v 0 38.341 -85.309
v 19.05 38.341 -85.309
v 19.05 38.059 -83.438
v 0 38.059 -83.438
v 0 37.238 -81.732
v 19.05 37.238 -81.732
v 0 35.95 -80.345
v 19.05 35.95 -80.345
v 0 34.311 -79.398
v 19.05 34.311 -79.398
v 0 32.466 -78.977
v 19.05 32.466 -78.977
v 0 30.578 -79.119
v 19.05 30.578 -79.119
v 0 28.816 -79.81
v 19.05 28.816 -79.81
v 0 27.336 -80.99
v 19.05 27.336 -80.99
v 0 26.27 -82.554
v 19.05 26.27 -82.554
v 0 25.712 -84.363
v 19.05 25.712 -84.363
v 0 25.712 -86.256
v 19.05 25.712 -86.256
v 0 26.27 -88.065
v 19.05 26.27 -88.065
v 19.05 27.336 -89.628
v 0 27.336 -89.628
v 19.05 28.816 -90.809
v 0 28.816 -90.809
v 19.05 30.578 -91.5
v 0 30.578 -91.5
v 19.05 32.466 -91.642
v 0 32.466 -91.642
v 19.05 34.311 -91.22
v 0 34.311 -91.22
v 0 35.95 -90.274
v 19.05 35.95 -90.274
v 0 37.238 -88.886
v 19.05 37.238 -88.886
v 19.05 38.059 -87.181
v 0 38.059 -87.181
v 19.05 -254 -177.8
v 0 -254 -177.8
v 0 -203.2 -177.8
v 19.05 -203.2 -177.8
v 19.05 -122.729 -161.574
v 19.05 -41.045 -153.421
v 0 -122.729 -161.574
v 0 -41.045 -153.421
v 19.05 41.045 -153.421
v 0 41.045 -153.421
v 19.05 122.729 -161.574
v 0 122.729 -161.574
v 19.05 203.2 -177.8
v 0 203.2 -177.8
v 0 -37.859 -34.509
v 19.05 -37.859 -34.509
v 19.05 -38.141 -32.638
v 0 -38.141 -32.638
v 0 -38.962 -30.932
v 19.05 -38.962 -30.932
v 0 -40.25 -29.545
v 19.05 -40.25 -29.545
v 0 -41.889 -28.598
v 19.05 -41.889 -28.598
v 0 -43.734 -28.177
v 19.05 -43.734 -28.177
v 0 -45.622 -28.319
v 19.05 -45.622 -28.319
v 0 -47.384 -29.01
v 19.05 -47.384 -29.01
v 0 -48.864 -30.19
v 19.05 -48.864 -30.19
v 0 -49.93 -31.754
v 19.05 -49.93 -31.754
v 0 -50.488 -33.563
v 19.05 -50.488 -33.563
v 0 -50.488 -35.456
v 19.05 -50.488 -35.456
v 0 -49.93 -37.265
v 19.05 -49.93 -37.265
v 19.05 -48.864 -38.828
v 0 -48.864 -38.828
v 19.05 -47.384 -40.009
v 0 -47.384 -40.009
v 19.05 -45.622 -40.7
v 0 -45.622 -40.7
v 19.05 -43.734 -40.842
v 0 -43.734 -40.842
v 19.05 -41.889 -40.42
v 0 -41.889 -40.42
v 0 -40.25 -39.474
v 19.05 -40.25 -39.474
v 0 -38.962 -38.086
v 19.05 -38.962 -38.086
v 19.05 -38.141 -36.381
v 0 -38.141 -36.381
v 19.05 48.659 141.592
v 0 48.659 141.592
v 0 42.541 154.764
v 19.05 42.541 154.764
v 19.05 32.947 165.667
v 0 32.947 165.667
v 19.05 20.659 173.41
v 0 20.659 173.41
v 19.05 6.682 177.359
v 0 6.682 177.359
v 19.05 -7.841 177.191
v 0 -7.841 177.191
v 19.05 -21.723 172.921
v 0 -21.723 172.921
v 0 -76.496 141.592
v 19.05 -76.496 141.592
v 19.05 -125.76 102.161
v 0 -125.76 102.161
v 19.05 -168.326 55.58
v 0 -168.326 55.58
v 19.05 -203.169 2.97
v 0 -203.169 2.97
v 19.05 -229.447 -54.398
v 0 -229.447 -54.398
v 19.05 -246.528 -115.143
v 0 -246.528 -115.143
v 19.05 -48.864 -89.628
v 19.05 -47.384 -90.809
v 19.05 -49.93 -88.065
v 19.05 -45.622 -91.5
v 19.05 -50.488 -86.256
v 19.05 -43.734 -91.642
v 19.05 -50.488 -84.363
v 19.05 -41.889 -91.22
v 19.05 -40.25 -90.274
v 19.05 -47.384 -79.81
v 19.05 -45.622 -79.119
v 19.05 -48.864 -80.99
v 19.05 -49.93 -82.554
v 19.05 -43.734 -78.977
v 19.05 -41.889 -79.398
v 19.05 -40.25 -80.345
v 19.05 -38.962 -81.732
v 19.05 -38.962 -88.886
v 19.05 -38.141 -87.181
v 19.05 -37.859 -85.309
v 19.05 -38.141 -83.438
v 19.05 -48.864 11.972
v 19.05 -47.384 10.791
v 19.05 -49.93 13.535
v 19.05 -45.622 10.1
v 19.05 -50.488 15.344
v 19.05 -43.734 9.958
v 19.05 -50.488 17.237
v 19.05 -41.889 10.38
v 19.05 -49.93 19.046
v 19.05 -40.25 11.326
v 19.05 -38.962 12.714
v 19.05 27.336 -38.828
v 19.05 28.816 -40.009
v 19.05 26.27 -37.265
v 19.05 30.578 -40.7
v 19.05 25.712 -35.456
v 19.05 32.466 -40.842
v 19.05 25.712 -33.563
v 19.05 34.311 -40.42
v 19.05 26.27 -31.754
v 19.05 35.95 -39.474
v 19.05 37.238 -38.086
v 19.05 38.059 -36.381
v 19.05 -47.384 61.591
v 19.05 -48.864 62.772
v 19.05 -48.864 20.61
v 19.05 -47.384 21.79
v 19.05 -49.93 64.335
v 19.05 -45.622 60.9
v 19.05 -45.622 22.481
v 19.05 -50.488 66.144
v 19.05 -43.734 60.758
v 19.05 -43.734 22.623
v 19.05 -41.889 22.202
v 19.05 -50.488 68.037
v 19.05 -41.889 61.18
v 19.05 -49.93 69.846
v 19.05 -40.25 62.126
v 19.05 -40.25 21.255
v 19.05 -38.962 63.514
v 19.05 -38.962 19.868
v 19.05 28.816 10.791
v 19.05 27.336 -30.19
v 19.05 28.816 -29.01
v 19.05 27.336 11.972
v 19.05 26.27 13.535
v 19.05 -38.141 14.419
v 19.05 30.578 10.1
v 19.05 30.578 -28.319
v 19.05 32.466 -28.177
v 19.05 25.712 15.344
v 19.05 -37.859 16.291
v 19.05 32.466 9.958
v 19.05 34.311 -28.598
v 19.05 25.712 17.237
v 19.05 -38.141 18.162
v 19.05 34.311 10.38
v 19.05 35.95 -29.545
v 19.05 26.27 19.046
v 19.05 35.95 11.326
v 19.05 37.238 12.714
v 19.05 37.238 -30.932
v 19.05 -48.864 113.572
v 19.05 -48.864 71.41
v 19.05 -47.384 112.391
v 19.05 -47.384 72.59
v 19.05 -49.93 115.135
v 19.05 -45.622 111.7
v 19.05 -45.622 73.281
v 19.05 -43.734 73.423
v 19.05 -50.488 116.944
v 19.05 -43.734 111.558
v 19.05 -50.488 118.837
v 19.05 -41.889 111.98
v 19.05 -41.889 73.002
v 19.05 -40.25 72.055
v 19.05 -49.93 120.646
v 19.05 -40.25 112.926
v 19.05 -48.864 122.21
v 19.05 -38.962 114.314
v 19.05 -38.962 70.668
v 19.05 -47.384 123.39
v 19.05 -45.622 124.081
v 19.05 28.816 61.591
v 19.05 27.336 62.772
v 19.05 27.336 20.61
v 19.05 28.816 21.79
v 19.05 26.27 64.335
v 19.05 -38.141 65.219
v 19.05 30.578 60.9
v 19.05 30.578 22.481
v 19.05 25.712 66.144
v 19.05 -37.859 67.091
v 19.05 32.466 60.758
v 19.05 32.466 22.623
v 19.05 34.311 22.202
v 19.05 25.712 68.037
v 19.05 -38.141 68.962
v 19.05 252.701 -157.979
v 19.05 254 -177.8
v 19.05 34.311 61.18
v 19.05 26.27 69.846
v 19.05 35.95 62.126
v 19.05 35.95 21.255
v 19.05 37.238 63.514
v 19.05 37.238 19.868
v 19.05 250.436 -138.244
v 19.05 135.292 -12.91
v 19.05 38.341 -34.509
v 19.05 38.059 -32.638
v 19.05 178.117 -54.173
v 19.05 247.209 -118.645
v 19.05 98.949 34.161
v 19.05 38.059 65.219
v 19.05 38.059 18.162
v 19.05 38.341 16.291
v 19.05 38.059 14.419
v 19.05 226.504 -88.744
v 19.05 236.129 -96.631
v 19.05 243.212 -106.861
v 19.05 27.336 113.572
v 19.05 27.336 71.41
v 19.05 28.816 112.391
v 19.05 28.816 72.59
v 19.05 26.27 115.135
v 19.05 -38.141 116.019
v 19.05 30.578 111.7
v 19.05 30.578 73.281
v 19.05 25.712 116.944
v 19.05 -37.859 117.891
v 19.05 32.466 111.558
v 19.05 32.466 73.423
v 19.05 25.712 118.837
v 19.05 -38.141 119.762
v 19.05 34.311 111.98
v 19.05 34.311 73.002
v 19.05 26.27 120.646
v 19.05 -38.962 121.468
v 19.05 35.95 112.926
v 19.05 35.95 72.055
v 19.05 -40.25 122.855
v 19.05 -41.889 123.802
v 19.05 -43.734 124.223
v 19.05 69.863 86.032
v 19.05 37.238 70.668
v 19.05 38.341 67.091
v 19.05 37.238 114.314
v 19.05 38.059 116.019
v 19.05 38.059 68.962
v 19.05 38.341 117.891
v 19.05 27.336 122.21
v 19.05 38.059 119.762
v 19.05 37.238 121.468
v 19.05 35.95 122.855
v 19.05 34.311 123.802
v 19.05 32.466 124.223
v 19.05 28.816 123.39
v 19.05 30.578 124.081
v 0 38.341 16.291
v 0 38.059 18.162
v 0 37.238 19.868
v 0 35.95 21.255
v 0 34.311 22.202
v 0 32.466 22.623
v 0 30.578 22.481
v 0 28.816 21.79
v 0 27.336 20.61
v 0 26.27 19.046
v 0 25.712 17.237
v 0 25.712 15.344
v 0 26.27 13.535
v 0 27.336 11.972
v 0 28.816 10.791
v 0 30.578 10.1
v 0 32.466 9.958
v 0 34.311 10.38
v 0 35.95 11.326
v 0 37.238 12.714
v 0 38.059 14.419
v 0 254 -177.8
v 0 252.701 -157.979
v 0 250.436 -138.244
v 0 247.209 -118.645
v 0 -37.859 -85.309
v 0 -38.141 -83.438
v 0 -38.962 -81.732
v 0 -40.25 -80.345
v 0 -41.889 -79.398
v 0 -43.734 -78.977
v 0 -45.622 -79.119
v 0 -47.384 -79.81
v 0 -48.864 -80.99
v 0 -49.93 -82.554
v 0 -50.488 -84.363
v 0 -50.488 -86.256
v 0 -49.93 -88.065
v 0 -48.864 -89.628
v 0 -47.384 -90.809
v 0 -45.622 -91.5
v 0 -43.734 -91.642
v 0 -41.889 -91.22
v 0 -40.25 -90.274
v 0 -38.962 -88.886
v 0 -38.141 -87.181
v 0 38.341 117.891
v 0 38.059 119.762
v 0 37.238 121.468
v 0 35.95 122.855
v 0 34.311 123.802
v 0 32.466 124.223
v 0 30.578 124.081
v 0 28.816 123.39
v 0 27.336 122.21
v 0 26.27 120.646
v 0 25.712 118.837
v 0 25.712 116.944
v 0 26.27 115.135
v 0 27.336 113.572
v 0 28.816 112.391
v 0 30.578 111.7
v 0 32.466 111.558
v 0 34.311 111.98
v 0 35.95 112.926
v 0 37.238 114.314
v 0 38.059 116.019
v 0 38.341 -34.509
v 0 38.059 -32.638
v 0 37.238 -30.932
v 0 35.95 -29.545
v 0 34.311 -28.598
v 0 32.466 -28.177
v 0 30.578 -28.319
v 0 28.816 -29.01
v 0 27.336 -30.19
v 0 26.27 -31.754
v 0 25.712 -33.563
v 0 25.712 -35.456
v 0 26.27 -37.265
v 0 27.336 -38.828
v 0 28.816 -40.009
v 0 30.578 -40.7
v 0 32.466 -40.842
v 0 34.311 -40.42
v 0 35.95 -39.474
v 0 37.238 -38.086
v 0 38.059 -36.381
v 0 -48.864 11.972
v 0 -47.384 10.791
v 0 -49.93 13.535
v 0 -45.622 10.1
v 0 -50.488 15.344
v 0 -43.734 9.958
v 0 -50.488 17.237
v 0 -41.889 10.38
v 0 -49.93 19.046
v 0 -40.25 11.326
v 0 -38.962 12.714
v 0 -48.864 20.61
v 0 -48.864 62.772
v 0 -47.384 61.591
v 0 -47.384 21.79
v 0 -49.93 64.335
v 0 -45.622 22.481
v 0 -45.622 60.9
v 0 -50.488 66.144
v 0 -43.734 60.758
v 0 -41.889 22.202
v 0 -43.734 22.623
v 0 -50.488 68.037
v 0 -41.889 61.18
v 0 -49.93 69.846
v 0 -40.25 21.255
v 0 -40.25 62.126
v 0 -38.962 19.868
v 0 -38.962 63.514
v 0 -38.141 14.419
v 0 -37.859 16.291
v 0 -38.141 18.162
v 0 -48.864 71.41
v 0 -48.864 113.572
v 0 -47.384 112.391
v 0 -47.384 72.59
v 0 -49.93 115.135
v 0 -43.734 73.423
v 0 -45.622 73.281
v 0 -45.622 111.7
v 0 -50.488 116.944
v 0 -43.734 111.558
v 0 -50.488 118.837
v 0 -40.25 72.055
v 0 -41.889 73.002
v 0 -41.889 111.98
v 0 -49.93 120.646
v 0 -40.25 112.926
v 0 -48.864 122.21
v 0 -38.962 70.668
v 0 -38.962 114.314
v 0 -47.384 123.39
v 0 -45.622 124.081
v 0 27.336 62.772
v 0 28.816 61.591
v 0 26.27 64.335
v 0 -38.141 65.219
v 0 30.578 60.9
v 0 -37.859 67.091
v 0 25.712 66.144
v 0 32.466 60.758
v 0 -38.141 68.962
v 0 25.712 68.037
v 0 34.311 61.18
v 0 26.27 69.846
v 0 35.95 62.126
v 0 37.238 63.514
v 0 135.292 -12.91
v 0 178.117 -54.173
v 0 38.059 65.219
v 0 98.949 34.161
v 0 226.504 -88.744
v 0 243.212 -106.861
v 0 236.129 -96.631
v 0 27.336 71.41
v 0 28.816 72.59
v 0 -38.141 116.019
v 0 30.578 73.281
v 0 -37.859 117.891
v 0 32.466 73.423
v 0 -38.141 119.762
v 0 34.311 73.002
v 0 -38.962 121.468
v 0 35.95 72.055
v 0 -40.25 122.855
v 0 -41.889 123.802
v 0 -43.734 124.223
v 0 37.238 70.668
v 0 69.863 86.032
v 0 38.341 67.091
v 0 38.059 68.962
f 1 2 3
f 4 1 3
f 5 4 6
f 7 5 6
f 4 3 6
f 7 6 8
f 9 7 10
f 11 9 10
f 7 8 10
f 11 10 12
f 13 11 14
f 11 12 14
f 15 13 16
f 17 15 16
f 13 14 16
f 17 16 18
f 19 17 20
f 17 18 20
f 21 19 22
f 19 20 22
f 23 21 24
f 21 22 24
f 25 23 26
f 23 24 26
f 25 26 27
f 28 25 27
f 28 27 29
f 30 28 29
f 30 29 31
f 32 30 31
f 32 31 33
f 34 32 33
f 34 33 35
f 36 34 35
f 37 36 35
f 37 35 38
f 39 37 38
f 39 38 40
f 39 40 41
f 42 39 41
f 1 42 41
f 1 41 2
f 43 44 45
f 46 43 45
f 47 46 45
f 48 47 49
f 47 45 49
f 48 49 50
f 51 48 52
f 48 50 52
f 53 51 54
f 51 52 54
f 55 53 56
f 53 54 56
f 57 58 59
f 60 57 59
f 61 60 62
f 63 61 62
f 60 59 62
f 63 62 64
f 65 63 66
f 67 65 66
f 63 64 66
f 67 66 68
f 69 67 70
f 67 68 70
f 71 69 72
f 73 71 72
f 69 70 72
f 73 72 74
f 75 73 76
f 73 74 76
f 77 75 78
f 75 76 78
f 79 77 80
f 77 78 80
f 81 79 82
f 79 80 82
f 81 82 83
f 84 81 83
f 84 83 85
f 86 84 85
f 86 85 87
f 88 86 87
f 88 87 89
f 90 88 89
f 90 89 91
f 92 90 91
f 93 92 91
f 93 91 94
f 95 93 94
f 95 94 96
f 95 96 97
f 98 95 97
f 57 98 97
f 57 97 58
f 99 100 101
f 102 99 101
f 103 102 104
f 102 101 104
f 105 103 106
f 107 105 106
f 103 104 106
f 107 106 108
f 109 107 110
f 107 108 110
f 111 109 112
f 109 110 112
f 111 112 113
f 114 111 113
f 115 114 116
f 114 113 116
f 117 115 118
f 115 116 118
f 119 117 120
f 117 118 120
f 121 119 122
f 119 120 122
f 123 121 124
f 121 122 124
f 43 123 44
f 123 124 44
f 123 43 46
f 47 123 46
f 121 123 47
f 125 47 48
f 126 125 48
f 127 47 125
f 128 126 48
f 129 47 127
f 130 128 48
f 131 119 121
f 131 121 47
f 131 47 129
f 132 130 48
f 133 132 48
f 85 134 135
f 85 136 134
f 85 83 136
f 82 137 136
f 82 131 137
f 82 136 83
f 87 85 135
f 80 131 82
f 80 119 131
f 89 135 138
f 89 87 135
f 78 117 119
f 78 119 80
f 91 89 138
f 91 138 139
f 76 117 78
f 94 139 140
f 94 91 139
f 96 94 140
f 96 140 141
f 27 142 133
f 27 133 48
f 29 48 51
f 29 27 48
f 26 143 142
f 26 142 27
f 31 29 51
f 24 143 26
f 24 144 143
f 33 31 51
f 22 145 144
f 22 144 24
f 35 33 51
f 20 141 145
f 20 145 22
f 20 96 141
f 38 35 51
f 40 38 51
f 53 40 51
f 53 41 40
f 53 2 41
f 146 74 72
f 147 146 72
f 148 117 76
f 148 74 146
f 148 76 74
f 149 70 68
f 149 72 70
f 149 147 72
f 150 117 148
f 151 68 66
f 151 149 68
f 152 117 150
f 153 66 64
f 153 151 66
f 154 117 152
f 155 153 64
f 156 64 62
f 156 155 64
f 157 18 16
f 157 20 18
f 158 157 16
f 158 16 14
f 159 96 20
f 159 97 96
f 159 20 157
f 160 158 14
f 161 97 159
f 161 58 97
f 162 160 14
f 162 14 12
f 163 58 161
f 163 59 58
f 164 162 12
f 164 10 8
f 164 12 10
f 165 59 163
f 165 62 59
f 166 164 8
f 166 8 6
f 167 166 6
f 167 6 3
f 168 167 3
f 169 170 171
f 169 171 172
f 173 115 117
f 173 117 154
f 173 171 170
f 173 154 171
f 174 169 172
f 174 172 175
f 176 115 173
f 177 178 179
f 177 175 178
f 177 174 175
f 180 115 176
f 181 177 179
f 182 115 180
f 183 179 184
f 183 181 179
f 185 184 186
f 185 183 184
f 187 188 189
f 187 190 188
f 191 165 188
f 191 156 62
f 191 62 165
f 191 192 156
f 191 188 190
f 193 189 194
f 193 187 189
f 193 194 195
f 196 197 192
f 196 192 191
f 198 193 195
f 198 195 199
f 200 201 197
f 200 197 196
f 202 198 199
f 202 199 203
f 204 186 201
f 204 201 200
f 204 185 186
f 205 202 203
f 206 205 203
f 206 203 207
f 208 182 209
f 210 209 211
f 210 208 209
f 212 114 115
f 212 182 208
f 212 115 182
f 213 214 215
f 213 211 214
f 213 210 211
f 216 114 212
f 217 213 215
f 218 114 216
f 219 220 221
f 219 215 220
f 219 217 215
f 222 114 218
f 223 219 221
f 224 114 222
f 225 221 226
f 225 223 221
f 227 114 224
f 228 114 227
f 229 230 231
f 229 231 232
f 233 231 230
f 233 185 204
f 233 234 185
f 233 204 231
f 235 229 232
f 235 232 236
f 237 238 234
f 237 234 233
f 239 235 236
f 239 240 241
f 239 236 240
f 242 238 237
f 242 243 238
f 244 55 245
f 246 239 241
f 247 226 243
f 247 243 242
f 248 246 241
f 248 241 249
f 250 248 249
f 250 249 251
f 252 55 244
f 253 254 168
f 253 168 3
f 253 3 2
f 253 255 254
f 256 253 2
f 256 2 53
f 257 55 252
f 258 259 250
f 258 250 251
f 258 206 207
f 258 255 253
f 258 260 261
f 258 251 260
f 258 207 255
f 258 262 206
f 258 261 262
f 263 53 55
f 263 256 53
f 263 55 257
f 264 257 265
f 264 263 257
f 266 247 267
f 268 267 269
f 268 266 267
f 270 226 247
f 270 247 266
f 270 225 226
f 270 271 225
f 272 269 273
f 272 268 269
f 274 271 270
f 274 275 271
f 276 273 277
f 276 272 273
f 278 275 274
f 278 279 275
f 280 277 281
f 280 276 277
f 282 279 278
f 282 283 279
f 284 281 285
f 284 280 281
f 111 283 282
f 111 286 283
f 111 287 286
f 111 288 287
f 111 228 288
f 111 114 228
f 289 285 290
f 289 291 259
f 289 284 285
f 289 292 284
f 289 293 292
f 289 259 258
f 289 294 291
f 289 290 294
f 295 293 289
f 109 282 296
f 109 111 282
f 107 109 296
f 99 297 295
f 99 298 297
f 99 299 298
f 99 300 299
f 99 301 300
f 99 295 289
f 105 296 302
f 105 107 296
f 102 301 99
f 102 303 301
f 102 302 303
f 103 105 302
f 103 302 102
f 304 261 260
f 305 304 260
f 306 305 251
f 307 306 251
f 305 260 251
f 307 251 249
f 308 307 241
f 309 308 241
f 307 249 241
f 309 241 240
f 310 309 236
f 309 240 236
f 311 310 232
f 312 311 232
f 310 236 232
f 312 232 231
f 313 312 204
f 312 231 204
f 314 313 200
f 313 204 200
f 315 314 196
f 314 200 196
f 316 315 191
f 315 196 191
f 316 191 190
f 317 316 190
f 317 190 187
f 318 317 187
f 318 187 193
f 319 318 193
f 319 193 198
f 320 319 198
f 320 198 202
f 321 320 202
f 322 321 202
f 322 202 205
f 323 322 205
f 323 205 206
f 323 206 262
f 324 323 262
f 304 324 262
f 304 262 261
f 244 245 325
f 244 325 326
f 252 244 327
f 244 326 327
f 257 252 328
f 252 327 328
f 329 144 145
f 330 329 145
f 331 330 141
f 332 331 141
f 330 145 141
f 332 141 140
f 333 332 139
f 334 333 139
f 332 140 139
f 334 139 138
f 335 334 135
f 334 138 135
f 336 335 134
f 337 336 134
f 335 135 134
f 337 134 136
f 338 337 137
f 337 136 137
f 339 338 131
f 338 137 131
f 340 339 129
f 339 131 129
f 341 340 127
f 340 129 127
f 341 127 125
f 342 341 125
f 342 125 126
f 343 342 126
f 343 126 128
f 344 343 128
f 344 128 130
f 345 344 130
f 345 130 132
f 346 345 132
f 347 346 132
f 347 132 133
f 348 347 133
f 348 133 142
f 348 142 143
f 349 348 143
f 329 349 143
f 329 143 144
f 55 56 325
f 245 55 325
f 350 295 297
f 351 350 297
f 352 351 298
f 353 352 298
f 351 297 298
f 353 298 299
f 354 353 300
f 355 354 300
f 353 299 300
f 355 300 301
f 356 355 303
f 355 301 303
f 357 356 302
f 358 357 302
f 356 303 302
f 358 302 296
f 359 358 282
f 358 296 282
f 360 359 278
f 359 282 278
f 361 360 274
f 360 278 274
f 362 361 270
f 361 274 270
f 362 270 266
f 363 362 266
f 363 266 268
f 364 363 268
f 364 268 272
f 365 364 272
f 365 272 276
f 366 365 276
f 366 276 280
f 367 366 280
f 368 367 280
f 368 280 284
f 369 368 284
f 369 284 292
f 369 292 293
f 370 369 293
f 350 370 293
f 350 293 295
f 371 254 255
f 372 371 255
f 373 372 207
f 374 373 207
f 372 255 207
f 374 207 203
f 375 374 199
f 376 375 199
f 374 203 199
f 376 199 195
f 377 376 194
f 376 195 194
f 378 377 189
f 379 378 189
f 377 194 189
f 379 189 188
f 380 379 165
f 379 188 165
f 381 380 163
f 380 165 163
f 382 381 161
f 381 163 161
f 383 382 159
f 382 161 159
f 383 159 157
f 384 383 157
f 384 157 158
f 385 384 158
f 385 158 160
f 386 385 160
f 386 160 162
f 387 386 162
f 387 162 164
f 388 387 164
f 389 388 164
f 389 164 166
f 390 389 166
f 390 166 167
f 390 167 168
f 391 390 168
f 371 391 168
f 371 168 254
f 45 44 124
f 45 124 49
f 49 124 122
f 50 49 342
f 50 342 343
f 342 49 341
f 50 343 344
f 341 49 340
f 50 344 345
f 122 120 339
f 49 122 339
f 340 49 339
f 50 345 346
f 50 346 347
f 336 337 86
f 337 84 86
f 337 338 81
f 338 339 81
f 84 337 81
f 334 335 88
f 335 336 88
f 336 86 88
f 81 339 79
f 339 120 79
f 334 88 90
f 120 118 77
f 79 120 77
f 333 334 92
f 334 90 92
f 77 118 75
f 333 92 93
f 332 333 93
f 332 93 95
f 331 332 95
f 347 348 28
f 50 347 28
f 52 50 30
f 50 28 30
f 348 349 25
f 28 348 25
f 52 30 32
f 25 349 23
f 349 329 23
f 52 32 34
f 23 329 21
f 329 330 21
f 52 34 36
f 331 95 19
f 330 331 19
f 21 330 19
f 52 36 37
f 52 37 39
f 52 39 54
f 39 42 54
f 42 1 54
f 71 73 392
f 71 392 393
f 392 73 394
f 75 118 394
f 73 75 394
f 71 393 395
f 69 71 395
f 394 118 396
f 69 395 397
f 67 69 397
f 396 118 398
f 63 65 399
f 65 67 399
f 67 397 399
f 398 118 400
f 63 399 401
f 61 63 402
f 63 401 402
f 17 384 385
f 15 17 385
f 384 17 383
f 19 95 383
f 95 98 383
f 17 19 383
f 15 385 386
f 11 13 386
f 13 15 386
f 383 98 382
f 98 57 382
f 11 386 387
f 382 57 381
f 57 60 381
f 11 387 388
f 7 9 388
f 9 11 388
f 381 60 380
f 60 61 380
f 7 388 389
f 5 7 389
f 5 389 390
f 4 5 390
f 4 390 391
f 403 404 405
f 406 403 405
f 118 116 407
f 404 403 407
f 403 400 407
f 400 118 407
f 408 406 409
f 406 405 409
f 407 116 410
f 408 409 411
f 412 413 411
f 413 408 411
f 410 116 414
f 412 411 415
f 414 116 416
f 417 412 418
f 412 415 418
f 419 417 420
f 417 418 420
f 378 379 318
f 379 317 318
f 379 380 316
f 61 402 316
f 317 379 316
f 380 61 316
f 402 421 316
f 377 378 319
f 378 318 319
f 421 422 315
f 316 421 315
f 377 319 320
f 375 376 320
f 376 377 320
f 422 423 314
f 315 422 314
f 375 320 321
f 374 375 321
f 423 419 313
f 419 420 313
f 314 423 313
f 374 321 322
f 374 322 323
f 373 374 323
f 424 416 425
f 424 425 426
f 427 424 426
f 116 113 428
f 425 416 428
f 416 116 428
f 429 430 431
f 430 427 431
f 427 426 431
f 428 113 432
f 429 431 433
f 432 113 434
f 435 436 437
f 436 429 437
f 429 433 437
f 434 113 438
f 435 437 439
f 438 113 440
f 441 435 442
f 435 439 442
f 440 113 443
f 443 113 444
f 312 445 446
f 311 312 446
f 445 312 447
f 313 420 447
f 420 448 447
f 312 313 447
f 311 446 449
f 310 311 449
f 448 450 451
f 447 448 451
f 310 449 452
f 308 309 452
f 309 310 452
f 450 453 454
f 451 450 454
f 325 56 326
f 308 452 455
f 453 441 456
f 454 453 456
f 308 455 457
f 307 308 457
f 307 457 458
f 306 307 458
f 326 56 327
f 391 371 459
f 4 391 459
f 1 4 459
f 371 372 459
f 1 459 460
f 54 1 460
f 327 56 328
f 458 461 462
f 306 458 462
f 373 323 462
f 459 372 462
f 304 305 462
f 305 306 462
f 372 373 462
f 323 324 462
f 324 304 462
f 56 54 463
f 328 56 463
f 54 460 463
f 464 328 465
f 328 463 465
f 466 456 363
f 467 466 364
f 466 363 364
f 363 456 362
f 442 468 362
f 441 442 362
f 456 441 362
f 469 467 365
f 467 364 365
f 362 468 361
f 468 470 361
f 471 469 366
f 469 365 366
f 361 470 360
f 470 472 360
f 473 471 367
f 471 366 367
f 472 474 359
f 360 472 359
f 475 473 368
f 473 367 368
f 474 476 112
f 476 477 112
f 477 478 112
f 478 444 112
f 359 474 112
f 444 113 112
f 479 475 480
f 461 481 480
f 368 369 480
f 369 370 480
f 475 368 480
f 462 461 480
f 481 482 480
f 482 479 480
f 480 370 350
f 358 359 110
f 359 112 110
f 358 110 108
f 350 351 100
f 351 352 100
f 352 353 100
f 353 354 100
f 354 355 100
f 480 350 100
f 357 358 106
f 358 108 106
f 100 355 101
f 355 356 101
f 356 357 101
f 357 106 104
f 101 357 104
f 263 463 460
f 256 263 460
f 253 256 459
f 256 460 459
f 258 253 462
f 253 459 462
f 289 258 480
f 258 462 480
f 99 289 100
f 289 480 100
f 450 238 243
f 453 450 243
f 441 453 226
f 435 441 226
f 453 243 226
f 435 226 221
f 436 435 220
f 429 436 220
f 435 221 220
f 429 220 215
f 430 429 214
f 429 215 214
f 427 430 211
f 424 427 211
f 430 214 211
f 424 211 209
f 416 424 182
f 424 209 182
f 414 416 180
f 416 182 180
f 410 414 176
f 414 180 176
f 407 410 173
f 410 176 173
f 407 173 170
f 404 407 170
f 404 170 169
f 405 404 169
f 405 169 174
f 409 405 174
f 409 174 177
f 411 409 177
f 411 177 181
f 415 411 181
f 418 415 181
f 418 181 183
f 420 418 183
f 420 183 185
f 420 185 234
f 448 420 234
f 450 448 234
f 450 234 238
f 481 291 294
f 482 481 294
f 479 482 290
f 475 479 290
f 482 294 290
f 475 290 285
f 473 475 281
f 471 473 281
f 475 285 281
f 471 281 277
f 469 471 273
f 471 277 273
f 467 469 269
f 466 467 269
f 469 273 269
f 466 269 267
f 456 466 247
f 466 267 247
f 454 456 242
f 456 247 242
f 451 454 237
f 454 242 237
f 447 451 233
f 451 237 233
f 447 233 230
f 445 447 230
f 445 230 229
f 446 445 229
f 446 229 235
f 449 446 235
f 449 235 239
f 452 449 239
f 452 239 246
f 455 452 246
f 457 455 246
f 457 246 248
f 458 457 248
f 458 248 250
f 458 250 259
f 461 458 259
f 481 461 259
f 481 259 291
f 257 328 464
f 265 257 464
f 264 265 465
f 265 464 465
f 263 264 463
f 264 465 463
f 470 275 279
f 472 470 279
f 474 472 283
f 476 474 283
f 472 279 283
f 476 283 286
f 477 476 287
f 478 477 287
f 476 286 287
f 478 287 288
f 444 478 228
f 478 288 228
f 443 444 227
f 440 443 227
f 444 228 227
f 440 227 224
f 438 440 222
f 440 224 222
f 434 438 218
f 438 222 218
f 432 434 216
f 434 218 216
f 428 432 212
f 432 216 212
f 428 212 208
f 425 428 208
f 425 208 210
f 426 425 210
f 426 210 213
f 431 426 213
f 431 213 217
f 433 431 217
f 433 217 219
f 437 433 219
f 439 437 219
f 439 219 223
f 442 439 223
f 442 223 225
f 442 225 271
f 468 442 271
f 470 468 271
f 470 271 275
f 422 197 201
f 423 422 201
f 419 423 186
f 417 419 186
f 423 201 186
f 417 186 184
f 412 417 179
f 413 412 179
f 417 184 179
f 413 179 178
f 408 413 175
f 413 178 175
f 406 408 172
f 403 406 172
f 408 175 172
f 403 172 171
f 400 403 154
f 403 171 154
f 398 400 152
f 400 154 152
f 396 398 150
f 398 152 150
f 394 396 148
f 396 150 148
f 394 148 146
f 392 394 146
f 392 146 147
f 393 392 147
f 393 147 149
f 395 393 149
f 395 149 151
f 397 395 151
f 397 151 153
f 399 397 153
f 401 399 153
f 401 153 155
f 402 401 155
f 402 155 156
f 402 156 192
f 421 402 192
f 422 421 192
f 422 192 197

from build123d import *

# Parameters (mm, degrees)
F1_DEPTH = 19.05
F2_R     = 6.35
F3_DEPTH = 19.051


with BuildPart() as f1:
    # F0 (on Right) → F1 (new body)
    with BuildSketch(Plane.YZ):
        with BuildLine():
            ThreePointArc((-21.722689, 172.921289), (-186.770129, 29.95218), (-254, -177.8))
            Line((-254, -177.8), (-203.2, -177.8))
            ThreePointArc((-203.2, -177.8), (0, -152.4), (203.2, -177.8))
            Line((203.2, -177.8), (254, -177.8))
            ThreePointArc((254, -177.8), (251.689261, -148.097726), (247.208804, -118.64454))
            ThreePointArc((247.208804, -118.64454), (240.0276, -101.498698), (226.504407, -88.74437))
            ThreePointArc((226.504407, -88.74437), (116.258342, 9.959742), (48.659161, 141.591986))
            ThreePointArc((48.659161, 141.591986), (20.658526, 173.409755), (-21.722689, 172.921289))
        make_face()
    extrude(amount=F1_DEPTH)

    # F2 (on face) → F3 (cut, through all)
    with BuildSketch(Plane.YZ.offset(19.05)):
        with Locations((31.991019, -85.309384)):
            Circle(F2_R)
        with Locations((31.991019, -34.509384)):
            Circle(F2_R)
        with Locations((31.991019, 16.290616)):
            Circle(F2_R)
        with Locations((31.991019, 67.090616)):
            Circle(F2_R)
        with Locations((-44.208981, -85.309384)):
            Circle(F2_R)
        with Locations((-44.208981, -34.509384)):
            Circle(F2_R)
        with Locations((-44.208981, 16.290616)):
            Circle(F2_R)
        with Locations((-44.208981, 67.090616)):
            Circle(F2_R)
        with Locations((31.991019, 117.890616)):
            Circle(F2_R)
        with Locations((-44.208981, 117.890616)):
            Circle(F2_R)
    extrude(amount=-F3_DEPTH, mode=Mode.SUBTRACT)


solid = f1.part
